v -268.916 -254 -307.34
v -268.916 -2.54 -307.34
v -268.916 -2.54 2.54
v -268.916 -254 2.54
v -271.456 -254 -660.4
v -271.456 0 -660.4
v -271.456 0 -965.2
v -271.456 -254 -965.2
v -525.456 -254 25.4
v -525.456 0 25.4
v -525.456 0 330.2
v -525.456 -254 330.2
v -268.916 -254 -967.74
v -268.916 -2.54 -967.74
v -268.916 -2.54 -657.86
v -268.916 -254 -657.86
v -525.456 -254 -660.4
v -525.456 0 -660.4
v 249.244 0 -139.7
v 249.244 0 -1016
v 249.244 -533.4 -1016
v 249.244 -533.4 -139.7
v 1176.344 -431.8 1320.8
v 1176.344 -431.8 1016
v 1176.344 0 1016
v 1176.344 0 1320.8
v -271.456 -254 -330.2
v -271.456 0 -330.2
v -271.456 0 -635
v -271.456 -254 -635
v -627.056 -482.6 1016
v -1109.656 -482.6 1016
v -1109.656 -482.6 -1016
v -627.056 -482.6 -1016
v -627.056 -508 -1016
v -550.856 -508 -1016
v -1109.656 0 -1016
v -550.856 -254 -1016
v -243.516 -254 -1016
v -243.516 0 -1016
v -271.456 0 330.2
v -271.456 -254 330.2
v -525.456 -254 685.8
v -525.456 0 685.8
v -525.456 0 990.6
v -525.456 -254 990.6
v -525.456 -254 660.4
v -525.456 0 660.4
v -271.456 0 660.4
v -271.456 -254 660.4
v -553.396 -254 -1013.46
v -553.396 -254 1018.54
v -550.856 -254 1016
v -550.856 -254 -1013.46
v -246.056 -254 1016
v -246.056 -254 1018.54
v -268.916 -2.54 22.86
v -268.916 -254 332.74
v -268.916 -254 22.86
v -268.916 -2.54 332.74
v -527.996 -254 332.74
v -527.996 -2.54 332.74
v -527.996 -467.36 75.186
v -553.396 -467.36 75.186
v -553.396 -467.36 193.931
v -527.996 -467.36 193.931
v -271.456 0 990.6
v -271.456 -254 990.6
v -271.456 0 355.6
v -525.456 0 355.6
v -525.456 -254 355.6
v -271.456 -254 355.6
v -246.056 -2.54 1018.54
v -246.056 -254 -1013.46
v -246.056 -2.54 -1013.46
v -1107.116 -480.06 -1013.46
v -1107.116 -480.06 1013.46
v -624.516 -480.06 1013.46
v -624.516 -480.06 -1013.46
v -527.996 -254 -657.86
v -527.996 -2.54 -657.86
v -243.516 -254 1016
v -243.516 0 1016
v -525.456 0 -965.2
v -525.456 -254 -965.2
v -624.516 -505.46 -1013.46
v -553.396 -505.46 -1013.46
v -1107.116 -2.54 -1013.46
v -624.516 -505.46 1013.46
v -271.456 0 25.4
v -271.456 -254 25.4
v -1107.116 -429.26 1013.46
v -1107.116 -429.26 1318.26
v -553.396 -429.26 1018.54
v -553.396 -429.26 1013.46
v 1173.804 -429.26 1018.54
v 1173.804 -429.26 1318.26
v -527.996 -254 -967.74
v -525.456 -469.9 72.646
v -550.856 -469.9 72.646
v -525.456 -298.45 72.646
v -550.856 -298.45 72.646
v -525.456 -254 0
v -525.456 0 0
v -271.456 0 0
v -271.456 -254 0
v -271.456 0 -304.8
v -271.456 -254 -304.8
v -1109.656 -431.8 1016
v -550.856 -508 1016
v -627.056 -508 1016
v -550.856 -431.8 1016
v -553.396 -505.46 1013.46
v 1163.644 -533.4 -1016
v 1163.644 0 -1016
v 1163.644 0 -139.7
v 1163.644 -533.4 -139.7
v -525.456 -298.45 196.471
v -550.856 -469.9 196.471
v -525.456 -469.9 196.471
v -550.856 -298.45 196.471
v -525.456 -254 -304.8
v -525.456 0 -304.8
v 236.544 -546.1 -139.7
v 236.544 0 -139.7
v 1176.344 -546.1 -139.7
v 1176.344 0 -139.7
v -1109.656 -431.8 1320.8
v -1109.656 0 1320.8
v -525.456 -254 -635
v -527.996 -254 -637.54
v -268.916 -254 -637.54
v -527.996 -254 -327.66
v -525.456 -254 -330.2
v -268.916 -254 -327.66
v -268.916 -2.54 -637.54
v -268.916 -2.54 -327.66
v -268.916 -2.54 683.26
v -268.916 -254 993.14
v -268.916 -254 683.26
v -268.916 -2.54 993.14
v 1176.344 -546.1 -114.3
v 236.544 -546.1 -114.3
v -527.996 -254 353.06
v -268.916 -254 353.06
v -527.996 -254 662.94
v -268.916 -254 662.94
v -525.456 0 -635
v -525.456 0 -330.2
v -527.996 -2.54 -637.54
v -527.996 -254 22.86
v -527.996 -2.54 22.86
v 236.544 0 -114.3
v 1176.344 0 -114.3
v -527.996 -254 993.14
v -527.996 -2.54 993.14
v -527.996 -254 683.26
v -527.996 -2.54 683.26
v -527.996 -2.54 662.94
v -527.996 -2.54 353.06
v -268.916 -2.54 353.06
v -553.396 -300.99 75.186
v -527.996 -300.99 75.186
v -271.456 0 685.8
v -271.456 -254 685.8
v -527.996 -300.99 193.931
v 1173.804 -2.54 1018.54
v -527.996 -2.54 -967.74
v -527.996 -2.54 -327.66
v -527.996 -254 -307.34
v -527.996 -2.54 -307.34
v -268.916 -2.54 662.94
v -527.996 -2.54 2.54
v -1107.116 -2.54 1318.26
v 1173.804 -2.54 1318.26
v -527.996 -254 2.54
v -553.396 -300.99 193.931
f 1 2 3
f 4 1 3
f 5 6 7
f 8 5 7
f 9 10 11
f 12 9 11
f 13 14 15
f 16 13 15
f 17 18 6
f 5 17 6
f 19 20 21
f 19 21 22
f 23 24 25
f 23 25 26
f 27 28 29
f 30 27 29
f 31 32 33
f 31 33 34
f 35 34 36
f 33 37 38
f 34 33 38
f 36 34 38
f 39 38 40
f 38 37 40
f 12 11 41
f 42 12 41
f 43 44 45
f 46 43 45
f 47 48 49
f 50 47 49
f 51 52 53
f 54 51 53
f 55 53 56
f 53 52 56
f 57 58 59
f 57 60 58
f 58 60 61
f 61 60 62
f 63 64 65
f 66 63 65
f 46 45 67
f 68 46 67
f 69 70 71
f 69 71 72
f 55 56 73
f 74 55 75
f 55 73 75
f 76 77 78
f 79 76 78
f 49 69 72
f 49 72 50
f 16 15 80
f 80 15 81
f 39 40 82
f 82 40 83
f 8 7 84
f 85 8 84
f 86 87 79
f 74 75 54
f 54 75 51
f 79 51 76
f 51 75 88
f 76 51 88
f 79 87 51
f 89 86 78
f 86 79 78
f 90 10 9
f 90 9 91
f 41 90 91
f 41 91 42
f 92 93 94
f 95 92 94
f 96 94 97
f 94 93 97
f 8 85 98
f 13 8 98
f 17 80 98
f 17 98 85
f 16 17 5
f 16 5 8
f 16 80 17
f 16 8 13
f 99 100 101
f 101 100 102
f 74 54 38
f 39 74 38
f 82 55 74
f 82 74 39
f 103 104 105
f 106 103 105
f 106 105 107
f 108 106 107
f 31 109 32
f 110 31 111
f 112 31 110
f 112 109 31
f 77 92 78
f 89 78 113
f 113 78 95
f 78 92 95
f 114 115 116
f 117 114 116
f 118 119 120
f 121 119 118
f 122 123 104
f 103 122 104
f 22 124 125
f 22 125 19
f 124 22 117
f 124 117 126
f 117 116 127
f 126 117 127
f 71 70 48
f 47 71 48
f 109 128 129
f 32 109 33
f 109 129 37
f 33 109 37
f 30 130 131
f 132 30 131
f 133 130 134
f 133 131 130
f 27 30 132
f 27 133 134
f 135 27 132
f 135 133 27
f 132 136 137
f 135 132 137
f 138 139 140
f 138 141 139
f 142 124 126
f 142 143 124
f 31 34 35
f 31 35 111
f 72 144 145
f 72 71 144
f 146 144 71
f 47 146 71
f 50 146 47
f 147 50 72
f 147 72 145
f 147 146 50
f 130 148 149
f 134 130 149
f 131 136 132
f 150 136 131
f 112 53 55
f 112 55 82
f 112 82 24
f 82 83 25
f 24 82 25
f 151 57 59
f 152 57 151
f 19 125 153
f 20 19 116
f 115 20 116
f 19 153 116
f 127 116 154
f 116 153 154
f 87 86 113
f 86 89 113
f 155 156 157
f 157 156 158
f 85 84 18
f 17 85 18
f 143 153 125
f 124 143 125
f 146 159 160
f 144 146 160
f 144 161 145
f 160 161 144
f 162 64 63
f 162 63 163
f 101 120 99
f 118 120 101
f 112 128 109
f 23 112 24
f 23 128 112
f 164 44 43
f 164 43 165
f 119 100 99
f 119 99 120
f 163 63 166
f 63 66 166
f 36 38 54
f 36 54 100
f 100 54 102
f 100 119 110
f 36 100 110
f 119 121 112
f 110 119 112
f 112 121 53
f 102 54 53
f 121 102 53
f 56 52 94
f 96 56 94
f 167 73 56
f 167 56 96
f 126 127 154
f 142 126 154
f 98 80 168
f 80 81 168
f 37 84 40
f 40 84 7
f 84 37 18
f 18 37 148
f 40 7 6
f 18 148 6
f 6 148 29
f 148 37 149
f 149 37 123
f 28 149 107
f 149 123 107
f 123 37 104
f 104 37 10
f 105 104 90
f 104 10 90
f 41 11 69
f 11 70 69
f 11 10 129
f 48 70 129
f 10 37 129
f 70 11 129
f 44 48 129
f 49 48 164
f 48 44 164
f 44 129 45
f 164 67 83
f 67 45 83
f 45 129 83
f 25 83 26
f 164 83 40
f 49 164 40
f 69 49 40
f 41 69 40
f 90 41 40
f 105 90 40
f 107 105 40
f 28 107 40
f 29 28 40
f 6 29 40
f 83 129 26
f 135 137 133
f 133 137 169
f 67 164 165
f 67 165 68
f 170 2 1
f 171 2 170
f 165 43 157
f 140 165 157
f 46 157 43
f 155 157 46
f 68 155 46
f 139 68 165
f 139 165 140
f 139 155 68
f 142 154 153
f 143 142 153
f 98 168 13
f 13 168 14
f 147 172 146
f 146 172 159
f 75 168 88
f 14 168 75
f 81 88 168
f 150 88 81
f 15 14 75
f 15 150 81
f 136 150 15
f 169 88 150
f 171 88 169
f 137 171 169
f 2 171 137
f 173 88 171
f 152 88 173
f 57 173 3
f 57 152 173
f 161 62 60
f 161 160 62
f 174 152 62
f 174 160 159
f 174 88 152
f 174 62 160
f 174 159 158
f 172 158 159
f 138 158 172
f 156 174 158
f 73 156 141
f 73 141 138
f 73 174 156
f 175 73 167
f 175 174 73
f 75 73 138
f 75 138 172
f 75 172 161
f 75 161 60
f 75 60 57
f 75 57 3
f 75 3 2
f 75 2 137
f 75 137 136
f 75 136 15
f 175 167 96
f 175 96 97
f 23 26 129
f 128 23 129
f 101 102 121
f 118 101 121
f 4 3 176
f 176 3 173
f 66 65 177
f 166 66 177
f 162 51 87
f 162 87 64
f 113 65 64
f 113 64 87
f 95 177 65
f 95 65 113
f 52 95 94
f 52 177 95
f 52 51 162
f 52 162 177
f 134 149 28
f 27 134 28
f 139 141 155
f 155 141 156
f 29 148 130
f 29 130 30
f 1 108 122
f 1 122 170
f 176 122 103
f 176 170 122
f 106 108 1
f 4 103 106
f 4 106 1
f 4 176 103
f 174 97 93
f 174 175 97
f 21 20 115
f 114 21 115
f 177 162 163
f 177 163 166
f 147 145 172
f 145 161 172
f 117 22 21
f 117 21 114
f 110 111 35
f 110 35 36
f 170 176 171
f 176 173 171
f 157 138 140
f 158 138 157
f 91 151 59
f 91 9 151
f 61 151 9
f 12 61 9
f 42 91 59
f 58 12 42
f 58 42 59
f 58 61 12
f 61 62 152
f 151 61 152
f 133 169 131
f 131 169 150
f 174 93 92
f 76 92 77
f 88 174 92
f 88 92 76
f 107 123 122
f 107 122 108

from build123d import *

# Parameters (mm, degrees)
F1_DEPTH = 546.1
F0_W     = 914.4
F0_H     = 876.3
F2_DEPTH = 533.4
F0_W_2   = 482.6
F0_H_2   = 2032
F3_DEPTH = 482.6
F0_W_3   = 76.2
F4_DEPTH = 508
F5_W     = 171.45
F5_H     = 123.825
F6_DEPTH = 25.4
F0_W_4   = 307.34
F0_W_5   = 254
F0_H_3   = 304.8
F0_H_4   = 25.4
F7_DEPTH = 254
F8_DEPTH = 431.8
F9_T     = -2.54


# Not quite as in the source:
# - a shell that OpenCascade refuses in one call is made with other operations: the cavity is built on its own and cut out
# - the program builds the solid bodies; features that only make, move or delete a surface that nothing else refers to are left out


with BuildPart() as f1:
    # F0 (on Front) → F1 (new body)
    with BuildSketch(Plane.XZ):
        Polygon((236.5439048201, -139.7), (249.2439048201, -139.7), (1163.6439048201, -139.7), (1176.3439048201, -139.7), (1176.3439048201, -114.3), (236.5439048201, -114.3), align=None)
    extrude(amount=F1_DEPTH)

    # F0 (on Front) → F2 (join)
    with BuildSketch(Plane.XZ):
        with Locations((706.4439048201, -577.85)):
            Rectangle(F0_W, F0_H)
    extrude(amount=F2_DEPTH)


with BuildPart() as f3:
    # F0 (on Front) → F3 (new body)
    with BuildSketch(Plane.XZ):
        with Locations((-868.3560951799, 0)):
            Rectangle(F0_W_2, F0_H_2)
    extrude(amount=F3_DEPTH)

    # F0 (on Front) → F4 (join)
    with BuildSketch(Plane.XZ):
        with Locations((-588.9560951799, 0)):
            Rectangle(F0_W_3, F0_H_2)
    extrude(amount=F4_DEPTH)

    # F5 (on face) → F6 (join)
    with BuildSketch(Plane.YZ.offset(-550.8560951799)):
        with Locations((-384.175, 134.5584170843)):
            Rectangle(F5_W, F5_H)
    extrude(amount=F6_DEPTH)

    # F0 (on Front) → F7 (join)
    with BuildSketch(Plane.XZ):
        with Locations((-397.1860951799, 0)):
            Rectangle(F0_W_4, F0_H_2)
        Polygon((-525.4560951799, -304.8), (-525.4560951799, 0), (-271.4560951799, 0), (-271.4560951799, -304.8), (-271.4560951799, -330.2), (-271.4560951799, -635), (-271.4560951799, -660.4), (-271.4560951799, -965.2), (-525.4560951799, -965.2), (-525.4560951799, -660.4), (-525.4560951799, -635), (-525.4560951799, -330.2), align=None, mode=Mode.SUBTRACT)
        with Locations((-398.4560951799, 177.8)):
            Rectangle(F0_W_5, F0_H_3, mode=Mode.SUBTRACT)
        with Locations((-398.4560951799, 508)):
            Rectangle(F0_W_5, F0_H_3, mode=Mode.SUBTRACT)
        with Locations((-398.4560951799, 838.2)):
            Rectangle(F0_W_5, F0_H_3, mode=Mode.SUBTRACT)
        with Locations((-398.4560951799, -317.5)):
            Rectangle(F0_W_5, F0_H_4)
        with Locations((-398.4560951799, -647.7)):
            Rectangle(F0_W_5, F0_H_4)
    extrude(amount=F7_DEPTH)

    # F0 (on Front) → F8 (join)
    with BuildSketch(Plane.XZ):
        Polygon((-1109.6560951799, 1320.8), (-1109.6560951799, 1016), (-627.0560951799, 1016), (-550.8560951799, 1016), (-243.5160951799, 1016), (1176.3439048201, 1016), (1176.3439048201, 1320.8), align=None)
    extrude(amount=F8_DEPTH)

    # F9: a shell. OpenCascade refuses it in one call, so the cavity is built on its own and cut out:
    # the body offset inwards by the wall thickness, plus a prism from it out through each open face.
    f9_core = offset(f3.part, amount=F9_T, kind=Kind.INTERSECTION, mode=Mode.PRIVATE)
    f9_exits = [f9_core.faces().sort_by_distance(p)[0] for p in [
        (-399.726095, -251.46, 997.988888),
    ]]
    add(f9_core, mode=Mode.SUBTRACT)
    extrude(f9_exits, amount=-F9_T, mode=Mode.SUBTRACT)


solid = Compound([f1.part, f3.part])
